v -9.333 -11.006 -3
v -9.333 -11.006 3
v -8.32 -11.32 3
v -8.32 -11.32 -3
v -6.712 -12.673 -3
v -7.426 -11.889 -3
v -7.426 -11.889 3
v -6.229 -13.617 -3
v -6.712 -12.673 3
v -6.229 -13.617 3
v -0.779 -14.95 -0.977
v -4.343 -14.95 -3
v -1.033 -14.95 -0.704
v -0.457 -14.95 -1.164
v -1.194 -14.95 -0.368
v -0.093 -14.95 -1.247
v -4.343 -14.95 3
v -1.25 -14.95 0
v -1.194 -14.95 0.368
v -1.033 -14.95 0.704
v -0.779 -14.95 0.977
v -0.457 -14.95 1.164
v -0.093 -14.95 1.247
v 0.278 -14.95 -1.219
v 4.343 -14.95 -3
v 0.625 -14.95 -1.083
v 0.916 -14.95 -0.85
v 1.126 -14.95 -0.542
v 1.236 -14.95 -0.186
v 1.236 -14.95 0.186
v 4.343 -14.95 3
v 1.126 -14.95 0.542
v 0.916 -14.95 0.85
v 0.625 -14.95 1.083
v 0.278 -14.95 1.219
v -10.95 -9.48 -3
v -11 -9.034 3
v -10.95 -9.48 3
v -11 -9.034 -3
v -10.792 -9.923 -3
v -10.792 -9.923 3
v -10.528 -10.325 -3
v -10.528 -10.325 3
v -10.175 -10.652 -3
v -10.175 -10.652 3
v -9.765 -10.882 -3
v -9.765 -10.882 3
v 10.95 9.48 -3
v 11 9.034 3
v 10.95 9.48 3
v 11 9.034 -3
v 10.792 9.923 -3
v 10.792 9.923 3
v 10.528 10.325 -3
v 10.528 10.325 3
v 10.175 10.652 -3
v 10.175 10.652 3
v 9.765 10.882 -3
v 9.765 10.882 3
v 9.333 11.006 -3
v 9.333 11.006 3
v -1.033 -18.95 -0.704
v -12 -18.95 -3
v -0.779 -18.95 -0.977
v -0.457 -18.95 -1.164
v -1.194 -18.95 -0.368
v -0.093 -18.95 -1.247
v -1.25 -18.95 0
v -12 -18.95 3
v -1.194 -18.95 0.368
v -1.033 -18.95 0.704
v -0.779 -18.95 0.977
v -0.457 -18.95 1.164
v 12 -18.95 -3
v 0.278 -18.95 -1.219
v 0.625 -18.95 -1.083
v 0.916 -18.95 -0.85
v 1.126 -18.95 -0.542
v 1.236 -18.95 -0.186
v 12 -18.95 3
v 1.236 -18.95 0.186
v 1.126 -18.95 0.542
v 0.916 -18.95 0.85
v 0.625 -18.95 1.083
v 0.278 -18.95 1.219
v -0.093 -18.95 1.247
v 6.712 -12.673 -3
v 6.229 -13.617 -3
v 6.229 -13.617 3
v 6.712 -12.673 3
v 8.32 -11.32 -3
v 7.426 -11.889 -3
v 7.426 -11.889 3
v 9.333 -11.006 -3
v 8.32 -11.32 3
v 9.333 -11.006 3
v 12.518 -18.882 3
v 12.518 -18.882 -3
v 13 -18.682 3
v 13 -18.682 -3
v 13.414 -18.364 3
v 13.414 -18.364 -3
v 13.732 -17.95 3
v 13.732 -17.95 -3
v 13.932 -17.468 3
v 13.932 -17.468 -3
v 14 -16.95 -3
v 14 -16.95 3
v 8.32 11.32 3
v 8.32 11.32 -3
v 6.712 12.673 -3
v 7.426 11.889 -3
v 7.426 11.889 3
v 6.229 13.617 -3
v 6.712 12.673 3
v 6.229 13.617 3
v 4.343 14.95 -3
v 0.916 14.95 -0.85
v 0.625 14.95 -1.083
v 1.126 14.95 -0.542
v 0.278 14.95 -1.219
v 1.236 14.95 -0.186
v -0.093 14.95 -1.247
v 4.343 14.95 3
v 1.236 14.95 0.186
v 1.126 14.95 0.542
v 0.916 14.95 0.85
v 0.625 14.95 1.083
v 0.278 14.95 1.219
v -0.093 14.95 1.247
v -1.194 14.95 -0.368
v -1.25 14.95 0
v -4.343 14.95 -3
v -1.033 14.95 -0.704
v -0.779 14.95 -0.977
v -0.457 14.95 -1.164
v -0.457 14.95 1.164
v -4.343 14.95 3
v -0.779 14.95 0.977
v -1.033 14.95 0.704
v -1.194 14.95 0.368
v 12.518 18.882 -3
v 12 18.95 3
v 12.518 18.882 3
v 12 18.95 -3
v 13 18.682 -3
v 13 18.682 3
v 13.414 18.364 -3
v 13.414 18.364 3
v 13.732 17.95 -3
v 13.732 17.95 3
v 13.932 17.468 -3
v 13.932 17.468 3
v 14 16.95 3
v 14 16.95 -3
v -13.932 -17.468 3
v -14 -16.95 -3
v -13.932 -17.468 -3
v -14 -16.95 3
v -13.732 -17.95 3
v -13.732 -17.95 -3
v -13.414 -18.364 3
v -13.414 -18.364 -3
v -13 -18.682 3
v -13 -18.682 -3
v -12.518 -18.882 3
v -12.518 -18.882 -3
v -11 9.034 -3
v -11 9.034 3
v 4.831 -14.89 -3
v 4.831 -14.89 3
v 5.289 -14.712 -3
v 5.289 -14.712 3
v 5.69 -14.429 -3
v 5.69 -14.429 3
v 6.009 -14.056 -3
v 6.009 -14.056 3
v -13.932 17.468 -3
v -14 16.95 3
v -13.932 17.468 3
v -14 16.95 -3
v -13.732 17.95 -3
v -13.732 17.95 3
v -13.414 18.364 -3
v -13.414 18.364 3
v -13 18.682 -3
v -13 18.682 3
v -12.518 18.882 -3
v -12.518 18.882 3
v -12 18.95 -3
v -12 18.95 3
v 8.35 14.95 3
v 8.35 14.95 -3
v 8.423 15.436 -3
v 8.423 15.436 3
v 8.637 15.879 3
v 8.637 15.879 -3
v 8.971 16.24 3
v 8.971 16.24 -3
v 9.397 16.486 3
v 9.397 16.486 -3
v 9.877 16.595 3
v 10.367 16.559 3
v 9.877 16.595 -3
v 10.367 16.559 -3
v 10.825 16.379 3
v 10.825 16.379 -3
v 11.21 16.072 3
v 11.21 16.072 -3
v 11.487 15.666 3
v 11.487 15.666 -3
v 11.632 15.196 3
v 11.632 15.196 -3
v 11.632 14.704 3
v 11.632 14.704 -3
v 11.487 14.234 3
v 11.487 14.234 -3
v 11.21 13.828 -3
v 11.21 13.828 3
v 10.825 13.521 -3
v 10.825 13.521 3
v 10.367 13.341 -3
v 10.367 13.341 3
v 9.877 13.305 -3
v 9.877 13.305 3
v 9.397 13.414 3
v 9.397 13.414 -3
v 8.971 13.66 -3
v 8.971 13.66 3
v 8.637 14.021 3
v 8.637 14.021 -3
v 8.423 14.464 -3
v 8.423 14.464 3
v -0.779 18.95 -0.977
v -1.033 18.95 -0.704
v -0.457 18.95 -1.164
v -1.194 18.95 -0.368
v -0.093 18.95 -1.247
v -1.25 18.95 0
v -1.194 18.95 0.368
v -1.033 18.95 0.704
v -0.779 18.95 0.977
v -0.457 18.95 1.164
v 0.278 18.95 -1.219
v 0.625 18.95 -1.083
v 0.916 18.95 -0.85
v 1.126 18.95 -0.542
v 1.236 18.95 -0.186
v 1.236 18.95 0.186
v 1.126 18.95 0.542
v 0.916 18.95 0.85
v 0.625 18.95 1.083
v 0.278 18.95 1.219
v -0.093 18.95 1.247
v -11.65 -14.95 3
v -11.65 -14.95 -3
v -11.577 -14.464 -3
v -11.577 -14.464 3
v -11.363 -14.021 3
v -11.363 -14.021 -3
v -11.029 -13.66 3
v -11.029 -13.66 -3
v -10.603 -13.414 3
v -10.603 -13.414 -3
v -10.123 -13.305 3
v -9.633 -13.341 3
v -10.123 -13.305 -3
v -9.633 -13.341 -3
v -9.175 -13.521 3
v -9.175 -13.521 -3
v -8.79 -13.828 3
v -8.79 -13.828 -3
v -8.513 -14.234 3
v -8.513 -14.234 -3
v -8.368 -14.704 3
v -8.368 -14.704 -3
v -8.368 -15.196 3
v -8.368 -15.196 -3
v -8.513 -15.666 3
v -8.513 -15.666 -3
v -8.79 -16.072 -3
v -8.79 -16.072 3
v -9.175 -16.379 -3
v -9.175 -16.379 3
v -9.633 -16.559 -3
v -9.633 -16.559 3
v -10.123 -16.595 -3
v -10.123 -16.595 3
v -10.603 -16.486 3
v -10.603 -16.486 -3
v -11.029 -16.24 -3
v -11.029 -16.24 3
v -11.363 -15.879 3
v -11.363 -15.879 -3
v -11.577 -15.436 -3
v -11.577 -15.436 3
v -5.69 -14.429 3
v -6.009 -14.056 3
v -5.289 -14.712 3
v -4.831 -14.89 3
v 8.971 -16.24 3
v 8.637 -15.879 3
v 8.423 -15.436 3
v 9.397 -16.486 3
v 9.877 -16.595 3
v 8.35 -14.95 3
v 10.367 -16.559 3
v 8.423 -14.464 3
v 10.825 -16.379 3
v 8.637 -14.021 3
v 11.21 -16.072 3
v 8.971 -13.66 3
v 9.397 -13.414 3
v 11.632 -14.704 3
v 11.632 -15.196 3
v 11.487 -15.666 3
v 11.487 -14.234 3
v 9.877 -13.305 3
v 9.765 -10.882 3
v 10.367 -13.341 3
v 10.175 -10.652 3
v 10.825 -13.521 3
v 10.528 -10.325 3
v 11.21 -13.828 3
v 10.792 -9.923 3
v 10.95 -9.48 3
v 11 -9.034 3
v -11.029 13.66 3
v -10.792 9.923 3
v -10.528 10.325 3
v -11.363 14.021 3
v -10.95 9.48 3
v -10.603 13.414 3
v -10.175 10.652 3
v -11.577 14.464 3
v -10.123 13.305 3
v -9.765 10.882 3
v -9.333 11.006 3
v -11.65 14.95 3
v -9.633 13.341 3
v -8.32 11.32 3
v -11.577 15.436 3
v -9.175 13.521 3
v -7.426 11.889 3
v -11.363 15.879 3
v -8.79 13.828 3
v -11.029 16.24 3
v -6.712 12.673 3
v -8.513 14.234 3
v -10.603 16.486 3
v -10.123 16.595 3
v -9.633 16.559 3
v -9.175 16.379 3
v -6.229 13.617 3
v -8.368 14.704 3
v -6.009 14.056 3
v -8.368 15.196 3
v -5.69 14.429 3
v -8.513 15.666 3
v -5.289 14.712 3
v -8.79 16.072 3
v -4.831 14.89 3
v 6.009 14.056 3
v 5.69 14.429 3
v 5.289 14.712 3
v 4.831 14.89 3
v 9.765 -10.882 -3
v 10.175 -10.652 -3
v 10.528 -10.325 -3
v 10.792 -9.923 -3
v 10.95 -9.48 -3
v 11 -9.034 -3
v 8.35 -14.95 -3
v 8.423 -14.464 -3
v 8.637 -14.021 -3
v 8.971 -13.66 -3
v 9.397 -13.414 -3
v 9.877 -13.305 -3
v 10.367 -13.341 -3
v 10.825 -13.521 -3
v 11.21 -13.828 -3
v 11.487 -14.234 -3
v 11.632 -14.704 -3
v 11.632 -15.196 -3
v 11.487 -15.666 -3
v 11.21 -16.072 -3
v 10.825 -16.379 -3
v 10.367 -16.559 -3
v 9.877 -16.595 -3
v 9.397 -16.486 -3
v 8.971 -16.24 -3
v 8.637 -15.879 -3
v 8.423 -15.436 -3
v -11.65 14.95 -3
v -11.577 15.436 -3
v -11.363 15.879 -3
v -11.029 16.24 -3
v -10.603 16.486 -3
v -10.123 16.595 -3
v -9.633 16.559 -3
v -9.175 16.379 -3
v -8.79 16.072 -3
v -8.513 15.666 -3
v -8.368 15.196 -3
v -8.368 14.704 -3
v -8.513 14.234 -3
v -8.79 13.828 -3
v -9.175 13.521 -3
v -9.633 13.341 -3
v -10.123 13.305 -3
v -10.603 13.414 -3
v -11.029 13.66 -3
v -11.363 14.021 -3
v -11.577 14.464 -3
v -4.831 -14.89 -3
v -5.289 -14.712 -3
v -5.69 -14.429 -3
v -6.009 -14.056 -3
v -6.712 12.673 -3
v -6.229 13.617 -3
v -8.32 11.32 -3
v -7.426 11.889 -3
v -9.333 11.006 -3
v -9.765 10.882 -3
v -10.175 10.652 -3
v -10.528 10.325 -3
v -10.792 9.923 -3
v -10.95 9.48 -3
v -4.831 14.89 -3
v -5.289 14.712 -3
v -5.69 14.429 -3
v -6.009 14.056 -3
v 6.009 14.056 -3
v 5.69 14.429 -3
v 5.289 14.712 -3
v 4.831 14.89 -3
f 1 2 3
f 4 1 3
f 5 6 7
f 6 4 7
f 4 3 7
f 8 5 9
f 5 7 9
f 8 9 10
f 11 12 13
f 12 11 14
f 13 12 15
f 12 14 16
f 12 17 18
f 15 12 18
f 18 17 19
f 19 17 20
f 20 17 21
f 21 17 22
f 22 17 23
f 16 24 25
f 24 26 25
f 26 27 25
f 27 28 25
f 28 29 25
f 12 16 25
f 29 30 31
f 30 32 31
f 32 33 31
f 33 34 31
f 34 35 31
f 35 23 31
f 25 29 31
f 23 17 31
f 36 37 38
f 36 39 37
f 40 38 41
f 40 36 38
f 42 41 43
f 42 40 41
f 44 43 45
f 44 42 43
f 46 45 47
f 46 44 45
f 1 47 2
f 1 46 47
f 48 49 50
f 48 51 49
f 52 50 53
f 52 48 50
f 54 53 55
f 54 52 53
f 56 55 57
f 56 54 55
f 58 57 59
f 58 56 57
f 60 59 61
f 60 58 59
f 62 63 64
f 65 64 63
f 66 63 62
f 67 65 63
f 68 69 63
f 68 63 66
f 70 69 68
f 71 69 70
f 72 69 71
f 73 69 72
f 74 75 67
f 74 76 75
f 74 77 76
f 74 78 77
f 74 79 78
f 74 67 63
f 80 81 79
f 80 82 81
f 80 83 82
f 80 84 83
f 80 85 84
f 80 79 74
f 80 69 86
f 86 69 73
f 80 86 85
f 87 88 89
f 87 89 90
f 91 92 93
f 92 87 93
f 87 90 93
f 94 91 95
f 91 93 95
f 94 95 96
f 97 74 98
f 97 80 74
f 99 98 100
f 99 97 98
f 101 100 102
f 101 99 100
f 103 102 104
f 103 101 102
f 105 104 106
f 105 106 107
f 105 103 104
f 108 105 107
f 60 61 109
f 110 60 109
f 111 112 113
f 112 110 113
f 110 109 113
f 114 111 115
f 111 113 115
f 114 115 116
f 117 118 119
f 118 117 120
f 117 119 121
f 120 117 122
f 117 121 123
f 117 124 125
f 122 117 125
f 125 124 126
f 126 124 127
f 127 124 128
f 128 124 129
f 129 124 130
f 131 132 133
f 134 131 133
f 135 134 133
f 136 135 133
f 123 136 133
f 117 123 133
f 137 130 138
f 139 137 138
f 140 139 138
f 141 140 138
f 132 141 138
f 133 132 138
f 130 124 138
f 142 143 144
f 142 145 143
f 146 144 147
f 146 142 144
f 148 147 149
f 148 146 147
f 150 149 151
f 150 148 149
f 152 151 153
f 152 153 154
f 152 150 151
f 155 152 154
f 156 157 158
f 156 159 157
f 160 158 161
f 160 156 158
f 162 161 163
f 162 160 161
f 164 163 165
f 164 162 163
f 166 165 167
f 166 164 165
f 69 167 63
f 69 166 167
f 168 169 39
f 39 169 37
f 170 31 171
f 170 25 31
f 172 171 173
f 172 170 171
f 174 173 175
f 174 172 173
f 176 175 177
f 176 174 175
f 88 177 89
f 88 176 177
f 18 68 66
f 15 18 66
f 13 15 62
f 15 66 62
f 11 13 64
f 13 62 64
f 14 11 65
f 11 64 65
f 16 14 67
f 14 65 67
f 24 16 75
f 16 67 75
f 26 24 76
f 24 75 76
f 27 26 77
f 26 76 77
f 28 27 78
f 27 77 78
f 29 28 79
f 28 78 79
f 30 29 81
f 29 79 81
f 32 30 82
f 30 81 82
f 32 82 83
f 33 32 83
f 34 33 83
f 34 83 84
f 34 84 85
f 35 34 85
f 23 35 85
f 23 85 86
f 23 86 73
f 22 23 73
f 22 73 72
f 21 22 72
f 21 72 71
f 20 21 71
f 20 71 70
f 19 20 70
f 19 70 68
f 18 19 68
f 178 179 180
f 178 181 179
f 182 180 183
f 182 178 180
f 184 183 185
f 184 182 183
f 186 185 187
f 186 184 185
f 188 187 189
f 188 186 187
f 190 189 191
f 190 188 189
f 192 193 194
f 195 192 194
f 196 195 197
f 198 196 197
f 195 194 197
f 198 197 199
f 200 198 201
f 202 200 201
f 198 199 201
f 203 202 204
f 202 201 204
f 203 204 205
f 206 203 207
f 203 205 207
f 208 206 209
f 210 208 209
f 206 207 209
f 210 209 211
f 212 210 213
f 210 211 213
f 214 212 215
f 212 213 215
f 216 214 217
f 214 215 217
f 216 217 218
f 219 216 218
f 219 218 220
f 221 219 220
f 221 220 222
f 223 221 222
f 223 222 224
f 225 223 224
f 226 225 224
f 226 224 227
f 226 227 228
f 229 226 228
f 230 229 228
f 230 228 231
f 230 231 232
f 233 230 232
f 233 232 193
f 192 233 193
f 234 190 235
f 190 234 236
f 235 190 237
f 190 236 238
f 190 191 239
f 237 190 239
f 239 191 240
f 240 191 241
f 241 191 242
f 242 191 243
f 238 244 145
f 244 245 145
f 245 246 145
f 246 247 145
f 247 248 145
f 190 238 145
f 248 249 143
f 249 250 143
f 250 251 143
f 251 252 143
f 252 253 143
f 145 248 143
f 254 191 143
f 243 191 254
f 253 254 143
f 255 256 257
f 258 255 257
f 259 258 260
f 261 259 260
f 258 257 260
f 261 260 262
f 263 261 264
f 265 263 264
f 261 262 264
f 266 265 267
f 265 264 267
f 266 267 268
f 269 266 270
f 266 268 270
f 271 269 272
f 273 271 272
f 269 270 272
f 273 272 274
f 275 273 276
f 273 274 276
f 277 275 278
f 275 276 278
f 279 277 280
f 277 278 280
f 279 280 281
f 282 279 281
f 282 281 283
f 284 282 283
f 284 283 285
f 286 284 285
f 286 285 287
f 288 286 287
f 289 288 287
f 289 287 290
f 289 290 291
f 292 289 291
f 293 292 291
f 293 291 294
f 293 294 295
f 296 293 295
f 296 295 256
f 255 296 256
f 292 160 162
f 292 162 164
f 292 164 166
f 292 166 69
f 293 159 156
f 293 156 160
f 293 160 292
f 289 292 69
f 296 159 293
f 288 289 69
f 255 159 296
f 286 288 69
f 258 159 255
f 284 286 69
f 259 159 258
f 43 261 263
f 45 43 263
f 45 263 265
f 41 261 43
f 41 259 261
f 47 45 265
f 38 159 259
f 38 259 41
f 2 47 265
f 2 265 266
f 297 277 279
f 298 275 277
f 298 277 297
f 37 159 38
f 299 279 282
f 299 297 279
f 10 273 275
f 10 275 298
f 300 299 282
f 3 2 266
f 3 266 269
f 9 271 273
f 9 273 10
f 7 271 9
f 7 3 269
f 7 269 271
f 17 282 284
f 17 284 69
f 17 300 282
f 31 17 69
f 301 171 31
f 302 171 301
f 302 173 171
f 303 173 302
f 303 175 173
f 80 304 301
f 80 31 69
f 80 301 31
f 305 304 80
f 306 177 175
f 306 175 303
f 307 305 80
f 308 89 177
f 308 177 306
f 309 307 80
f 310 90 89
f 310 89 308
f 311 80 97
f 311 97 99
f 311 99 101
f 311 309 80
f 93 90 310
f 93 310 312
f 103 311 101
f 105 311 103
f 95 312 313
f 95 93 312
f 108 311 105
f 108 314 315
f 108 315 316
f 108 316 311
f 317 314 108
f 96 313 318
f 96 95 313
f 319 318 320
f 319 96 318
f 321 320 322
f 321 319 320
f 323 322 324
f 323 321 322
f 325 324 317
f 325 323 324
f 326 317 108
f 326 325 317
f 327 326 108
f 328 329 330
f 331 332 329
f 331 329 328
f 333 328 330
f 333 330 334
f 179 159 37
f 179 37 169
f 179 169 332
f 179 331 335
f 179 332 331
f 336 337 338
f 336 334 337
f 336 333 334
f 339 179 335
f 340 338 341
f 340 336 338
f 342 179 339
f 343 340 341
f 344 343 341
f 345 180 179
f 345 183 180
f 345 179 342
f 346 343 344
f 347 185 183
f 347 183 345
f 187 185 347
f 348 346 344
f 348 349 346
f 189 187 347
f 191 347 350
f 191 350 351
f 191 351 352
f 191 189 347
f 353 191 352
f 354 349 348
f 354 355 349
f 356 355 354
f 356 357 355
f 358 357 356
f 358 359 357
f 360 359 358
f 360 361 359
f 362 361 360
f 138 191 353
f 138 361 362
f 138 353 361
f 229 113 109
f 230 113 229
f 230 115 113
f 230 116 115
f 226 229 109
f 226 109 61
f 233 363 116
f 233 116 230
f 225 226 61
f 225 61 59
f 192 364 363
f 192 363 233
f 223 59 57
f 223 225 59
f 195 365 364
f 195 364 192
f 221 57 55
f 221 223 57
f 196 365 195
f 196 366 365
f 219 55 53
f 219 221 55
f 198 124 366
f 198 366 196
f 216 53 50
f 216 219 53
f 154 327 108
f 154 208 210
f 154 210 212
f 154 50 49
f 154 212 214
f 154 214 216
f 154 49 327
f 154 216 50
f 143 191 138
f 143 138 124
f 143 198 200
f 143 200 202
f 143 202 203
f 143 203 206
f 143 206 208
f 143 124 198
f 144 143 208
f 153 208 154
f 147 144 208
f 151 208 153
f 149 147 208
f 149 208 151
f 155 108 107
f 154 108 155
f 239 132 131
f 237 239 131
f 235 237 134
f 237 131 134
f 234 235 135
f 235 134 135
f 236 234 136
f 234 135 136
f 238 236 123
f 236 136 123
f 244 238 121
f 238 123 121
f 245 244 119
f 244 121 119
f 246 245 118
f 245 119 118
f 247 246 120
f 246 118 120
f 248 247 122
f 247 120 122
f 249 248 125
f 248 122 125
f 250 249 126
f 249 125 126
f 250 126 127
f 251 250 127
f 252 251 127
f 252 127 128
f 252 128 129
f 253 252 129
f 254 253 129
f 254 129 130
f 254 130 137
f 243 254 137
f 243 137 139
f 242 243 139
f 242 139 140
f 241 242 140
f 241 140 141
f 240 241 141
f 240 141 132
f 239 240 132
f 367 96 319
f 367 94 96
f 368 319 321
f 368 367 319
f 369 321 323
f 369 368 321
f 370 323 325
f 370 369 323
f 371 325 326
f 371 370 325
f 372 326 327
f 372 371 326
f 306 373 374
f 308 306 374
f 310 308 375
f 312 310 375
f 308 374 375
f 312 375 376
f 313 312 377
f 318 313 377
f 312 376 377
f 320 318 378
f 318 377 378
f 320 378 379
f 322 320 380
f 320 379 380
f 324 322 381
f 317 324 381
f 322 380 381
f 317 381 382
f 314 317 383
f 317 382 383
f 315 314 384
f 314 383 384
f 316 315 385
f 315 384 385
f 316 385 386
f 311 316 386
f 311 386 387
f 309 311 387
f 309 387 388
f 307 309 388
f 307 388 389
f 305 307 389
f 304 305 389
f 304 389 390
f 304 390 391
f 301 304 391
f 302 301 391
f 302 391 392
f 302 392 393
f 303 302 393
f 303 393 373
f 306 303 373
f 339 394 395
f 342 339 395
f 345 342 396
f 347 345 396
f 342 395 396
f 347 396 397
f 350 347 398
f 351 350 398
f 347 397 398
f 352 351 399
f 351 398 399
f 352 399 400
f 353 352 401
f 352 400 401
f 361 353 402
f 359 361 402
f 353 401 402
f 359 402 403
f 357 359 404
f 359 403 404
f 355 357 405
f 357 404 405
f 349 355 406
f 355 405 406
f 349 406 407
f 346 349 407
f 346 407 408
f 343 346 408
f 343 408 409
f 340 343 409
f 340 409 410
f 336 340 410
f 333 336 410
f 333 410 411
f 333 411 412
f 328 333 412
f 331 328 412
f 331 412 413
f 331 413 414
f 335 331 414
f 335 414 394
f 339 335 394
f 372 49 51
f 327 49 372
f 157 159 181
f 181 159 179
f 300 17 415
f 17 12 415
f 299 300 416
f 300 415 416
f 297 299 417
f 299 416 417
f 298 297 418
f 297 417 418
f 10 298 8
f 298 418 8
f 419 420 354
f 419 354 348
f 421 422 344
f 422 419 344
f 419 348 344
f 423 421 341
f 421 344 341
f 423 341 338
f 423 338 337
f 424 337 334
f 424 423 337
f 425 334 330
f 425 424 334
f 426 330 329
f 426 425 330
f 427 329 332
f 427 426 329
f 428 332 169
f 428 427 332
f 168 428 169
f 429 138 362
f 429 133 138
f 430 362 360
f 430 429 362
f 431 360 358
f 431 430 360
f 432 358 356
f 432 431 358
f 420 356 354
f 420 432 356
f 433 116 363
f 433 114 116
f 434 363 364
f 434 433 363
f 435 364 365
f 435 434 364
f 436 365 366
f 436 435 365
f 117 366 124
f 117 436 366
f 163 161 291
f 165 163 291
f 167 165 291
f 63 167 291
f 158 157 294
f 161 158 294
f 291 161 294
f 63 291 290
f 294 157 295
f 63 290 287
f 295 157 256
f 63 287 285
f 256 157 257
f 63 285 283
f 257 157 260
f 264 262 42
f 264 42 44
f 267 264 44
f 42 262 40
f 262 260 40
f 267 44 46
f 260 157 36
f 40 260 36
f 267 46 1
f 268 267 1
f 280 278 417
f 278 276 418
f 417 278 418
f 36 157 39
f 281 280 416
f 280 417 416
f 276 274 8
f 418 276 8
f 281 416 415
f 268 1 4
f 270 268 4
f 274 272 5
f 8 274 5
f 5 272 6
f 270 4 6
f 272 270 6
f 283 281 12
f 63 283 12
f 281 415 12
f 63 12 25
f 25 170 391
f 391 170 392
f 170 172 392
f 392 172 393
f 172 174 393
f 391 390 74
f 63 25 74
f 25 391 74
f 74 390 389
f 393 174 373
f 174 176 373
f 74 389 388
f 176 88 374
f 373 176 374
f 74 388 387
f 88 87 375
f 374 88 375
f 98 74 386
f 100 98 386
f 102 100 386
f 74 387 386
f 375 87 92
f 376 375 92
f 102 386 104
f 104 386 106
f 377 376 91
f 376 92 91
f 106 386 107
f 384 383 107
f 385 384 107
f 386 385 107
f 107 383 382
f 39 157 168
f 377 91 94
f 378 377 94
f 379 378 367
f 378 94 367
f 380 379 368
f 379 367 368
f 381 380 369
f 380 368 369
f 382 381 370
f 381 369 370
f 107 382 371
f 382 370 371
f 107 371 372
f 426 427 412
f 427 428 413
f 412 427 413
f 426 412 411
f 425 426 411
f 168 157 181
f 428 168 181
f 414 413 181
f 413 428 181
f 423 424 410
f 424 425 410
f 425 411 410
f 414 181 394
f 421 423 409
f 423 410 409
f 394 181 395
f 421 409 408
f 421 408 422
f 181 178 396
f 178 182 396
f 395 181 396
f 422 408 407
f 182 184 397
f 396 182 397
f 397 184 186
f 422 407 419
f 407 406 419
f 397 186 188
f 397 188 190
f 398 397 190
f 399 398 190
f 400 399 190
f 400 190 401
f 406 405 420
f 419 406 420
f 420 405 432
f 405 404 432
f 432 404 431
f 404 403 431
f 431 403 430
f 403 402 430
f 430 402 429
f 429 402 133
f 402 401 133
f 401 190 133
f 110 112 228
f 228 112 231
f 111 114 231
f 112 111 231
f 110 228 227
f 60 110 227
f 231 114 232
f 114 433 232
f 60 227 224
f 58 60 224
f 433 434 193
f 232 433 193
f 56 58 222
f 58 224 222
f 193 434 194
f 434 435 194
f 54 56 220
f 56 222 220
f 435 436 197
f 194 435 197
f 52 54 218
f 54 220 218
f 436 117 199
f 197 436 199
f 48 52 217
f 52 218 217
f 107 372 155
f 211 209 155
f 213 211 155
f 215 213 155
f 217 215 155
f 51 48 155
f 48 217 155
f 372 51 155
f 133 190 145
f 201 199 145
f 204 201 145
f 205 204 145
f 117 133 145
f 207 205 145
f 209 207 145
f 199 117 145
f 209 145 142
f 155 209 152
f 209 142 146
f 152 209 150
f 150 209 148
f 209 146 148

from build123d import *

# Parameters (mm, degrees)
SKETCH_1_W          = 28
SKETCH_1_H          = 37.9
EXTRUDE_1_DEPTH     = 3
HOLE_WIZARD_M4_1_D  = 3.3
CUT_EXTRUDE_1_DEPTH = 8
FILLET_1_R          = 2
CUT_EXTRUDE_2_DEPTH = 8
FILLET_3_R          = 2
HOLE_WIZARD_M3_1_D  = 2.5


with BuildPart() as part:
    # 草图1 → 凸台-拉伸1 (new, symmetric)
    with BuildSketch(Plane.XY):
        Rectangle(SKETCH_1_W, SKETCH_1_H)
    extrude(amount=EXTRUDE_1_DEPTH, both=True)

    # M4 螺纹孔1 (through all)
    with Locations(Plane.XY.offset(3)):
        with Locations((-10, 14.95), (10, 14.95), (10, -14.95), (-10, -14.95)):
            Hole(HOLE_WIZARD_M4_1_D / 2)

    # 草图5 → 切除-拉伸1 (cut)
    with BuildSketch(Plane.XY.offset(3)):
        with BuildLine():
            ThreePointArc((-10, -10.95), (-7.171572875, -12.121572875), (-6, -14.95))
            Line((-6, -14.95), (6, -14.95))
            ThreePointArc((6, -14.95), (7.171572875, -12.121572875), (10, -10.95))
            Line((10, -10.95), (10, 10.95))
            ThreePointArc((10, 10.95), (7.171572875, 12.121572875), (6, 14.95))
            Line((6, 14.95), (-6, 14.95))
            ThreePointArc((-6, 14.95), (-7.171572875, 12.121572875), (-10, 10.95))
            Line((-10, 10.95), (-10, -10.95))
        make_face()
    extrude(amount=-CUT_EXTRUDE_1_DEPTH, mode=Mode.SUBTRACT)

    # 圆角1
    fillet_1_edges = [part.edges().sort_by_distance(p)[0] for p in [
        (14, -18.95, 0),
        (-14, -18.95, 0),
        (-14, 18.95, 0),
        (14, 18.95, 0),
    ]]
    fillet(fillet_1_edges, radius=FILLET_1_R)

    # 草图6 → 切除-拉伸2 (cut)
    with BuildSketch(Plane.XY.offset(3)):
        with BuildLine():
            Line((-11, 11.077016654), (-11, -11.077016654))
            ThreePointArc((-11, -11.077016654), (-10.50401717, -10.981881215), (-10, -10.95))
            Line((-10, -10.95), (-10, 10.95))
            ThreePointArc((-10, 10.95), (-10.50401717, 10.981881215), (-11, 11.077016654))
        make_face()
        with BuildLine():
            Line((11, 11.077016654), (11, -11.077016654))
            ThreePointArc((11, -11.077016654), (10.50401717, -10.981881215), (10, -10.95))
            Line((10, -10.95), (10, 10.95))
            ThreePointArc((10, 10.95), (10.50401717, 10.981881215), (11, 11.077016654))
        make_face()
    extrude(amount=-CUT_EXTRUDE_2_DEPTH, mode=Mode.SUBTRACT)

    # 圆角3
    fillet_3_edges = [part.edges().sort_by_distance(p)[0] for p in [
        (-11, 11.077016654, 0),
        (-11, -11.077016654, 0),
        (11, 11.077016654, 0),
        (11, -11.077016654, 0),
        (6, -14.95, 0),
        (-6, -14.95, 0),
        (-6, 14.95, 0),
        (6, 14.95, 0),
    ]]
    fillet(fillet_3_edges, radius=FILLET_3_R)

    # M3 螺纹孔1 (through all)
    with Locations(Plane(origin=(0, 18.95, 0), x_dir=(1, 0, 0), z_dir=(0, 1, 0))):
        with Locations((0, 0)):
            Hole(HOLE_WIZARD_M3_1_D / 2)


solid = part.part
